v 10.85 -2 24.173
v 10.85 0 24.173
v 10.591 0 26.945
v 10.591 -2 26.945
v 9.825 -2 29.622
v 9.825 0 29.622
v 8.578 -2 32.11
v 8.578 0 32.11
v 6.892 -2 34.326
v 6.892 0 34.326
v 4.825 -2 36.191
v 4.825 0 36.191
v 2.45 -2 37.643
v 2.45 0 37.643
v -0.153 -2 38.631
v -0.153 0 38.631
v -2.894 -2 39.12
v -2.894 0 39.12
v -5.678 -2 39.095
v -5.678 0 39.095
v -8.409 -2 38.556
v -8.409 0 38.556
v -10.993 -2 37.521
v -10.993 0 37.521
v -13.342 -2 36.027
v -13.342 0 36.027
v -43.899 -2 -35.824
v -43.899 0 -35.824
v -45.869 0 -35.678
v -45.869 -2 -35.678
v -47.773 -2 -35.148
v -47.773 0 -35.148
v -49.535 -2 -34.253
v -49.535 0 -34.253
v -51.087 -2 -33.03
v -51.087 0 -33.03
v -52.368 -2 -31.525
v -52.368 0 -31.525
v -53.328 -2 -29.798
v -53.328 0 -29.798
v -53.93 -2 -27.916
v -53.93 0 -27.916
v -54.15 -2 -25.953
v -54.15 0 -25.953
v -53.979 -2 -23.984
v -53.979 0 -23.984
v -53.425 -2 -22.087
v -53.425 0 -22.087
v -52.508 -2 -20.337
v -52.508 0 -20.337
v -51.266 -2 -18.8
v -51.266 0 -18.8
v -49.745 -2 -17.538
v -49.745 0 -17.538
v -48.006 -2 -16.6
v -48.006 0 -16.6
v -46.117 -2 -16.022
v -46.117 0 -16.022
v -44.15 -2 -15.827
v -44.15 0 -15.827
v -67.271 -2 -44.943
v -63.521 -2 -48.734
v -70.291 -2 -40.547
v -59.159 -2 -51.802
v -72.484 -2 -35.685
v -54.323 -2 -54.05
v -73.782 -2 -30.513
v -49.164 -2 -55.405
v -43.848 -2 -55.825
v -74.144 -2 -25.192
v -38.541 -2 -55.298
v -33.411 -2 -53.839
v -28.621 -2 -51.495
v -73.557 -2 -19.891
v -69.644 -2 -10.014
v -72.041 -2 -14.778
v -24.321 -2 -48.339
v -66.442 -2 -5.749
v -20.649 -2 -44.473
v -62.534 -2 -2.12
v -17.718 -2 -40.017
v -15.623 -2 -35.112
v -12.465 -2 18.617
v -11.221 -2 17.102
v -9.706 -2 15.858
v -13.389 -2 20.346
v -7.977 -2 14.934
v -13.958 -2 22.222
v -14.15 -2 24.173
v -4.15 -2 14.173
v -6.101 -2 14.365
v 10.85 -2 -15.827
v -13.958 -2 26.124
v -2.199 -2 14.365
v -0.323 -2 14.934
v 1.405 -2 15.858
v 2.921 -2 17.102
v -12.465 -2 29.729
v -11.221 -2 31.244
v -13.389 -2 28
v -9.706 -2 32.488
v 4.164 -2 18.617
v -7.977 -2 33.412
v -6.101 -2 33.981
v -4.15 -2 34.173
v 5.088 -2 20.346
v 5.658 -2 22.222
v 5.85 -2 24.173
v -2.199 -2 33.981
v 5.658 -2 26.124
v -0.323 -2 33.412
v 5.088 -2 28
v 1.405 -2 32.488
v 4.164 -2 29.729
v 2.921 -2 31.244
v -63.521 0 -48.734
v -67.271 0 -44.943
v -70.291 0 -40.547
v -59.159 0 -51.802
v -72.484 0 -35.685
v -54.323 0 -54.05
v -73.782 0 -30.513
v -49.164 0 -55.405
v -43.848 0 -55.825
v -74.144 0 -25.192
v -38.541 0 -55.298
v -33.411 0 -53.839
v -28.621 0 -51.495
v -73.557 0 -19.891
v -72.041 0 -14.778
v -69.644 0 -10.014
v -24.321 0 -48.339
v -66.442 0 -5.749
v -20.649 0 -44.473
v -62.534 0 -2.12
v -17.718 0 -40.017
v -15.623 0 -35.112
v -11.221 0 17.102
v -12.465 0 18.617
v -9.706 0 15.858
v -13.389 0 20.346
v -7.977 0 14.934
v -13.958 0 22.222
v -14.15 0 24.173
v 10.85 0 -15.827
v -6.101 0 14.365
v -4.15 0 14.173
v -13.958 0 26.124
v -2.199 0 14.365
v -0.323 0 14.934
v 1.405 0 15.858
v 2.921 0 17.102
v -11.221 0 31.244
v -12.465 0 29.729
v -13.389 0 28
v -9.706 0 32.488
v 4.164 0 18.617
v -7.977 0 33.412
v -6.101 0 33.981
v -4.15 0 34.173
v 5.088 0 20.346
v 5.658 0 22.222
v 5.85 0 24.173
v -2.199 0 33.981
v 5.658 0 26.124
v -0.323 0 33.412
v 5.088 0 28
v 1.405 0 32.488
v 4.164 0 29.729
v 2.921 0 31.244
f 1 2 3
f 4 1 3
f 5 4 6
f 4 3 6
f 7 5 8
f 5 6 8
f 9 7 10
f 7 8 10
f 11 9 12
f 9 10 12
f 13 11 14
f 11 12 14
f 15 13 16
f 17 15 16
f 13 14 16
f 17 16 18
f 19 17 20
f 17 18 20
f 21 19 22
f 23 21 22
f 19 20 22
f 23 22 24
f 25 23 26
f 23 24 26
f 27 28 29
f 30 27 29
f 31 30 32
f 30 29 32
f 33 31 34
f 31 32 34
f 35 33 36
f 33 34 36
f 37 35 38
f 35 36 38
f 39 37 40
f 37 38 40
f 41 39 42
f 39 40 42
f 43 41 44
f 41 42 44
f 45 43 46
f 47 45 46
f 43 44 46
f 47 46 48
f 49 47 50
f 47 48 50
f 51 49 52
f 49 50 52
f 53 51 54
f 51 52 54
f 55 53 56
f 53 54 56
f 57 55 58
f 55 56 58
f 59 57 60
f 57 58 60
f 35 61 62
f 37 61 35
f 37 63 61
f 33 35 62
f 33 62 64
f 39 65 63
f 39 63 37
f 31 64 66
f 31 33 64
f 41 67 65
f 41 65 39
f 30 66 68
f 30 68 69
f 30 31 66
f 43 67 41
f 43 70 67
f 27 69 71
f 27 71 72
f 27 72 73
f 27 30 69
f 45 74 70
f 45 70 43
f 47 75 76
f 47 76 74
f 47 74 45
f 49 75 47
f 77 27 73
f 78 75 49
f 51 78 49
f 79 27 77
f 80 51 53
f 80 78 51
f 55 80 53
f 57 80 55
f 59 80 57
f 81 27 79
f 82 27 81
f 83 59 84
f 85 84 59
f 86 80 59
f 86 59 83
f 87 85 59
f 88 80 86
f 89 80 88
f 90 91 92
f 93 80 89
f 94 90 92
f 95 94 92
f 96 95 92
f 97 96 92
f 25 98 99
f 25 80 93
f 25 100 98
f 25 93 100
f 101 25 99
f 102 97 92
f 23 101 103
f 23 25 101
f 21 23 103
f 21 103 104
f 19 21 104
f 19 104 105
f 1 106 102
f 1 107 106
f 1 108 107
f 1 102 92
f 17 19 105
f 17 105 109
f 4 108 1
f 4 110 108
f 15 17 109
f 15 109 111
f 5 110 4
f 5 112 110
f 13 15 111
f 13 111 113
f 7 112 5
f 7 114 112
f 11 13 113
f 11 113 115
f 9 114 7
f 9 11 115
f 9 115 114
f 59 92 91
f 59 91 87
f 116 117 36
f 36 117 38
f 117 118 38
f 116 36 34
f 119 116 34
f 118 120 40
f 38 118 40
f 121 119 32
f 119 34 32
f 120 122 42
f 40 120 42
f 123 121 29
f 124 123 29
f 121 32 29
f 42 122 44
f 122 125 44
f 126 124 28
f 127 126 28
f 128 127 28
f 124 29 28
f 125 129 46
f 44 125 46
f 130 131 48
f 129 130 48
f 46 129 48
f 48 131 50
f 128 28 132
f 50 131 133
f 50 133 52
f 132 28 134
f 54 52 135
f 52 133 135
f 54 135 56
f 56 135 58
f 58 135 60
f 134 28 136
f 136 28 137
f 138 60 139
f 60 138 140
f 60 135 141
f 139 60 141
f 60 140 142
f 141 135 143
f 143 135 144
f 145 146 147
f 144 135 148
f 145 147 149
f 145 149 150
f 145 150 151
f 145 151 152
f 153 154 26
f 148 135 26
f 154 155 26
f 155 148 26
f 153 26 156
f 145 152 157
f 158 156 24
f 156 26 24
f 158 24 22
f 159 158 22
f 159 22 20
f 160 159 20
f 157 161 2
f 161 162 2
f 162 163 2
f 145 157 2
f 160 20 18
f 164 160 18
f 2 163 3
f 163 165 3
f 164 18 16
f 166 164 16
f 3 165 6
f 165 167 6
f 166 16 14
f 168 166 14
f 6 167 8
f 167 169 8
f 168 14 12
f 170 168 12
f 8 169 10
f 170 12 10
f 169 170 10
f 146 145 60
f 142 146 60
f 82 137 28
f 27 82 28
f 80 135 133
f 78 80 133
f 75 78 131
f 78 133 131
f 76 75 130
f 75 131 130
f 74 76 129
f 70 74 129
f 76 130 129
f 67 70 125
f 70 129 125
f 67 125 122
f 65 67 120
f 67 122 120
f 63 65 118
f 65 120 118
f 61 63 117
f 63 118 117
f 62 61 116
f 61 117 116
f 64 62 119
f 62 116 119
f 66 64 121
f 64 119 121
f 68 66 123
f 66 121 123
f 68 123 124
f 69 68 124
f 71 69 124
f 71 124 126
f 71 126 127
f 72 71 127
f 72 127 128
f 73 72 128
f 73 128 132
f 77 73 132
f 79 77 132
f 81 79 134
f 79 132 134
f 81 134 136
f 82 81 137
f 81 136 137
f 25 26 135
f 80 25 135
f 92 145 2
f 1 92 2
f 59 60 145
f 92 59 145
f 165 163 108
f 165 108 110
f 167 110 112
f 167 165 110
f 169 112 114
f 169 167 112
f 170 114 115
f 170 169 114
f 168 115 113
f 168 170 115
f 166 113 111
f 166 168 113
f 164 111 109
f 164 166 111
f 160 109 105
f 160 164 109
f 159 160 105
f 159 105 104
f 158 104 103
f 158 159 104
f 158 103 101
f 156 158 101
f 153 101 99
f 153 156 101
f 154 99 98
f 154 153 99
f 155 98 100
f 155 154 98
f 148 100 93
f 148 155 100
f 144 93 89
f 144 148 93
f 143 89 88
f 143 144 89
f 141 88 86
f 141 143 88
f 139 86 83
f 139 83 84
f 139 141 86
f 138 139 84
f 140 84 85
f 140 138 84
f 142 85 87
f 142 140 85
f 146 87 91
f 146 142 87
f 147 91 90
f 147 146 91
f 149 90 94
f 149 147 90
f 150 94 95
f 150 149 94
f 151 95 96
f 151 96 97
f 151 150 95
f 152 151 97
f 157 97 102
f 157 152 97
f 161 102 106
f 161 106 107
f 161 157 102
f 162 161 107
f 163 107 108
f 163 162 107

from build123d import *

# Parameters (mm, degrees)
F0_R     = 10
F1_DEPTH = 2


with BuildPart() as f1:
    # F0 (on Front) → F1 (new body)
    with BuildSketch(Plane.XZ):
        with BuildLine():
            ThreePointArc((-62.534281, -2.119643), (-35.69599, 2.957285), (-15.866047, -15.826814))
            Line((-15.866047, -15.826814), (10.849682, -15.826814))
            Line((10.849682, -15.826814), (10.849682, 24.173186))
            ThreePointArc((10.849682, 24.173186), (-10.750328, 10.703225), (-13.3423, 36.026771))
            Line((-13.3423, 36.026771), (-62.534281, -2.119643))
        make_face()
        with BuildLine():
            ThreePointArc((10.849682, 24.173186), (2.449692, 37.643148), (-13.3423, 36.026771))
            ThreePointArc((-13.3423, 36.026771), (-10.750328, 10.703225), (10.849682, 24.173186))
        make_face()
        with Locations((-4.150318, 24.173186)):
            Circle(F0_R, mode=Mode.SUBTRACT)
        with BuildLine():
            Line((-44.150318, -15.826814), (-15.866047, -15.826814))
            ThreePointArc((-15.866047, -15.826814), (-35.69599, 2.957285), (-62.534281, -2.119643))
            ThreePointArc((-62.534281, -2.119643), (-61.408556, -50.365624), (-15.62346, -35.1122))
            Line((-15.62346, -35.1122), (-43.898783, -35.82365))
            ThreePointArc((-43.898783, -35.82365), (-54.149527, -25.952591), (-44.150318, -15.826814))
        make_face()
    extrude(amount=F1_DEPTH)


solid = f1.part
